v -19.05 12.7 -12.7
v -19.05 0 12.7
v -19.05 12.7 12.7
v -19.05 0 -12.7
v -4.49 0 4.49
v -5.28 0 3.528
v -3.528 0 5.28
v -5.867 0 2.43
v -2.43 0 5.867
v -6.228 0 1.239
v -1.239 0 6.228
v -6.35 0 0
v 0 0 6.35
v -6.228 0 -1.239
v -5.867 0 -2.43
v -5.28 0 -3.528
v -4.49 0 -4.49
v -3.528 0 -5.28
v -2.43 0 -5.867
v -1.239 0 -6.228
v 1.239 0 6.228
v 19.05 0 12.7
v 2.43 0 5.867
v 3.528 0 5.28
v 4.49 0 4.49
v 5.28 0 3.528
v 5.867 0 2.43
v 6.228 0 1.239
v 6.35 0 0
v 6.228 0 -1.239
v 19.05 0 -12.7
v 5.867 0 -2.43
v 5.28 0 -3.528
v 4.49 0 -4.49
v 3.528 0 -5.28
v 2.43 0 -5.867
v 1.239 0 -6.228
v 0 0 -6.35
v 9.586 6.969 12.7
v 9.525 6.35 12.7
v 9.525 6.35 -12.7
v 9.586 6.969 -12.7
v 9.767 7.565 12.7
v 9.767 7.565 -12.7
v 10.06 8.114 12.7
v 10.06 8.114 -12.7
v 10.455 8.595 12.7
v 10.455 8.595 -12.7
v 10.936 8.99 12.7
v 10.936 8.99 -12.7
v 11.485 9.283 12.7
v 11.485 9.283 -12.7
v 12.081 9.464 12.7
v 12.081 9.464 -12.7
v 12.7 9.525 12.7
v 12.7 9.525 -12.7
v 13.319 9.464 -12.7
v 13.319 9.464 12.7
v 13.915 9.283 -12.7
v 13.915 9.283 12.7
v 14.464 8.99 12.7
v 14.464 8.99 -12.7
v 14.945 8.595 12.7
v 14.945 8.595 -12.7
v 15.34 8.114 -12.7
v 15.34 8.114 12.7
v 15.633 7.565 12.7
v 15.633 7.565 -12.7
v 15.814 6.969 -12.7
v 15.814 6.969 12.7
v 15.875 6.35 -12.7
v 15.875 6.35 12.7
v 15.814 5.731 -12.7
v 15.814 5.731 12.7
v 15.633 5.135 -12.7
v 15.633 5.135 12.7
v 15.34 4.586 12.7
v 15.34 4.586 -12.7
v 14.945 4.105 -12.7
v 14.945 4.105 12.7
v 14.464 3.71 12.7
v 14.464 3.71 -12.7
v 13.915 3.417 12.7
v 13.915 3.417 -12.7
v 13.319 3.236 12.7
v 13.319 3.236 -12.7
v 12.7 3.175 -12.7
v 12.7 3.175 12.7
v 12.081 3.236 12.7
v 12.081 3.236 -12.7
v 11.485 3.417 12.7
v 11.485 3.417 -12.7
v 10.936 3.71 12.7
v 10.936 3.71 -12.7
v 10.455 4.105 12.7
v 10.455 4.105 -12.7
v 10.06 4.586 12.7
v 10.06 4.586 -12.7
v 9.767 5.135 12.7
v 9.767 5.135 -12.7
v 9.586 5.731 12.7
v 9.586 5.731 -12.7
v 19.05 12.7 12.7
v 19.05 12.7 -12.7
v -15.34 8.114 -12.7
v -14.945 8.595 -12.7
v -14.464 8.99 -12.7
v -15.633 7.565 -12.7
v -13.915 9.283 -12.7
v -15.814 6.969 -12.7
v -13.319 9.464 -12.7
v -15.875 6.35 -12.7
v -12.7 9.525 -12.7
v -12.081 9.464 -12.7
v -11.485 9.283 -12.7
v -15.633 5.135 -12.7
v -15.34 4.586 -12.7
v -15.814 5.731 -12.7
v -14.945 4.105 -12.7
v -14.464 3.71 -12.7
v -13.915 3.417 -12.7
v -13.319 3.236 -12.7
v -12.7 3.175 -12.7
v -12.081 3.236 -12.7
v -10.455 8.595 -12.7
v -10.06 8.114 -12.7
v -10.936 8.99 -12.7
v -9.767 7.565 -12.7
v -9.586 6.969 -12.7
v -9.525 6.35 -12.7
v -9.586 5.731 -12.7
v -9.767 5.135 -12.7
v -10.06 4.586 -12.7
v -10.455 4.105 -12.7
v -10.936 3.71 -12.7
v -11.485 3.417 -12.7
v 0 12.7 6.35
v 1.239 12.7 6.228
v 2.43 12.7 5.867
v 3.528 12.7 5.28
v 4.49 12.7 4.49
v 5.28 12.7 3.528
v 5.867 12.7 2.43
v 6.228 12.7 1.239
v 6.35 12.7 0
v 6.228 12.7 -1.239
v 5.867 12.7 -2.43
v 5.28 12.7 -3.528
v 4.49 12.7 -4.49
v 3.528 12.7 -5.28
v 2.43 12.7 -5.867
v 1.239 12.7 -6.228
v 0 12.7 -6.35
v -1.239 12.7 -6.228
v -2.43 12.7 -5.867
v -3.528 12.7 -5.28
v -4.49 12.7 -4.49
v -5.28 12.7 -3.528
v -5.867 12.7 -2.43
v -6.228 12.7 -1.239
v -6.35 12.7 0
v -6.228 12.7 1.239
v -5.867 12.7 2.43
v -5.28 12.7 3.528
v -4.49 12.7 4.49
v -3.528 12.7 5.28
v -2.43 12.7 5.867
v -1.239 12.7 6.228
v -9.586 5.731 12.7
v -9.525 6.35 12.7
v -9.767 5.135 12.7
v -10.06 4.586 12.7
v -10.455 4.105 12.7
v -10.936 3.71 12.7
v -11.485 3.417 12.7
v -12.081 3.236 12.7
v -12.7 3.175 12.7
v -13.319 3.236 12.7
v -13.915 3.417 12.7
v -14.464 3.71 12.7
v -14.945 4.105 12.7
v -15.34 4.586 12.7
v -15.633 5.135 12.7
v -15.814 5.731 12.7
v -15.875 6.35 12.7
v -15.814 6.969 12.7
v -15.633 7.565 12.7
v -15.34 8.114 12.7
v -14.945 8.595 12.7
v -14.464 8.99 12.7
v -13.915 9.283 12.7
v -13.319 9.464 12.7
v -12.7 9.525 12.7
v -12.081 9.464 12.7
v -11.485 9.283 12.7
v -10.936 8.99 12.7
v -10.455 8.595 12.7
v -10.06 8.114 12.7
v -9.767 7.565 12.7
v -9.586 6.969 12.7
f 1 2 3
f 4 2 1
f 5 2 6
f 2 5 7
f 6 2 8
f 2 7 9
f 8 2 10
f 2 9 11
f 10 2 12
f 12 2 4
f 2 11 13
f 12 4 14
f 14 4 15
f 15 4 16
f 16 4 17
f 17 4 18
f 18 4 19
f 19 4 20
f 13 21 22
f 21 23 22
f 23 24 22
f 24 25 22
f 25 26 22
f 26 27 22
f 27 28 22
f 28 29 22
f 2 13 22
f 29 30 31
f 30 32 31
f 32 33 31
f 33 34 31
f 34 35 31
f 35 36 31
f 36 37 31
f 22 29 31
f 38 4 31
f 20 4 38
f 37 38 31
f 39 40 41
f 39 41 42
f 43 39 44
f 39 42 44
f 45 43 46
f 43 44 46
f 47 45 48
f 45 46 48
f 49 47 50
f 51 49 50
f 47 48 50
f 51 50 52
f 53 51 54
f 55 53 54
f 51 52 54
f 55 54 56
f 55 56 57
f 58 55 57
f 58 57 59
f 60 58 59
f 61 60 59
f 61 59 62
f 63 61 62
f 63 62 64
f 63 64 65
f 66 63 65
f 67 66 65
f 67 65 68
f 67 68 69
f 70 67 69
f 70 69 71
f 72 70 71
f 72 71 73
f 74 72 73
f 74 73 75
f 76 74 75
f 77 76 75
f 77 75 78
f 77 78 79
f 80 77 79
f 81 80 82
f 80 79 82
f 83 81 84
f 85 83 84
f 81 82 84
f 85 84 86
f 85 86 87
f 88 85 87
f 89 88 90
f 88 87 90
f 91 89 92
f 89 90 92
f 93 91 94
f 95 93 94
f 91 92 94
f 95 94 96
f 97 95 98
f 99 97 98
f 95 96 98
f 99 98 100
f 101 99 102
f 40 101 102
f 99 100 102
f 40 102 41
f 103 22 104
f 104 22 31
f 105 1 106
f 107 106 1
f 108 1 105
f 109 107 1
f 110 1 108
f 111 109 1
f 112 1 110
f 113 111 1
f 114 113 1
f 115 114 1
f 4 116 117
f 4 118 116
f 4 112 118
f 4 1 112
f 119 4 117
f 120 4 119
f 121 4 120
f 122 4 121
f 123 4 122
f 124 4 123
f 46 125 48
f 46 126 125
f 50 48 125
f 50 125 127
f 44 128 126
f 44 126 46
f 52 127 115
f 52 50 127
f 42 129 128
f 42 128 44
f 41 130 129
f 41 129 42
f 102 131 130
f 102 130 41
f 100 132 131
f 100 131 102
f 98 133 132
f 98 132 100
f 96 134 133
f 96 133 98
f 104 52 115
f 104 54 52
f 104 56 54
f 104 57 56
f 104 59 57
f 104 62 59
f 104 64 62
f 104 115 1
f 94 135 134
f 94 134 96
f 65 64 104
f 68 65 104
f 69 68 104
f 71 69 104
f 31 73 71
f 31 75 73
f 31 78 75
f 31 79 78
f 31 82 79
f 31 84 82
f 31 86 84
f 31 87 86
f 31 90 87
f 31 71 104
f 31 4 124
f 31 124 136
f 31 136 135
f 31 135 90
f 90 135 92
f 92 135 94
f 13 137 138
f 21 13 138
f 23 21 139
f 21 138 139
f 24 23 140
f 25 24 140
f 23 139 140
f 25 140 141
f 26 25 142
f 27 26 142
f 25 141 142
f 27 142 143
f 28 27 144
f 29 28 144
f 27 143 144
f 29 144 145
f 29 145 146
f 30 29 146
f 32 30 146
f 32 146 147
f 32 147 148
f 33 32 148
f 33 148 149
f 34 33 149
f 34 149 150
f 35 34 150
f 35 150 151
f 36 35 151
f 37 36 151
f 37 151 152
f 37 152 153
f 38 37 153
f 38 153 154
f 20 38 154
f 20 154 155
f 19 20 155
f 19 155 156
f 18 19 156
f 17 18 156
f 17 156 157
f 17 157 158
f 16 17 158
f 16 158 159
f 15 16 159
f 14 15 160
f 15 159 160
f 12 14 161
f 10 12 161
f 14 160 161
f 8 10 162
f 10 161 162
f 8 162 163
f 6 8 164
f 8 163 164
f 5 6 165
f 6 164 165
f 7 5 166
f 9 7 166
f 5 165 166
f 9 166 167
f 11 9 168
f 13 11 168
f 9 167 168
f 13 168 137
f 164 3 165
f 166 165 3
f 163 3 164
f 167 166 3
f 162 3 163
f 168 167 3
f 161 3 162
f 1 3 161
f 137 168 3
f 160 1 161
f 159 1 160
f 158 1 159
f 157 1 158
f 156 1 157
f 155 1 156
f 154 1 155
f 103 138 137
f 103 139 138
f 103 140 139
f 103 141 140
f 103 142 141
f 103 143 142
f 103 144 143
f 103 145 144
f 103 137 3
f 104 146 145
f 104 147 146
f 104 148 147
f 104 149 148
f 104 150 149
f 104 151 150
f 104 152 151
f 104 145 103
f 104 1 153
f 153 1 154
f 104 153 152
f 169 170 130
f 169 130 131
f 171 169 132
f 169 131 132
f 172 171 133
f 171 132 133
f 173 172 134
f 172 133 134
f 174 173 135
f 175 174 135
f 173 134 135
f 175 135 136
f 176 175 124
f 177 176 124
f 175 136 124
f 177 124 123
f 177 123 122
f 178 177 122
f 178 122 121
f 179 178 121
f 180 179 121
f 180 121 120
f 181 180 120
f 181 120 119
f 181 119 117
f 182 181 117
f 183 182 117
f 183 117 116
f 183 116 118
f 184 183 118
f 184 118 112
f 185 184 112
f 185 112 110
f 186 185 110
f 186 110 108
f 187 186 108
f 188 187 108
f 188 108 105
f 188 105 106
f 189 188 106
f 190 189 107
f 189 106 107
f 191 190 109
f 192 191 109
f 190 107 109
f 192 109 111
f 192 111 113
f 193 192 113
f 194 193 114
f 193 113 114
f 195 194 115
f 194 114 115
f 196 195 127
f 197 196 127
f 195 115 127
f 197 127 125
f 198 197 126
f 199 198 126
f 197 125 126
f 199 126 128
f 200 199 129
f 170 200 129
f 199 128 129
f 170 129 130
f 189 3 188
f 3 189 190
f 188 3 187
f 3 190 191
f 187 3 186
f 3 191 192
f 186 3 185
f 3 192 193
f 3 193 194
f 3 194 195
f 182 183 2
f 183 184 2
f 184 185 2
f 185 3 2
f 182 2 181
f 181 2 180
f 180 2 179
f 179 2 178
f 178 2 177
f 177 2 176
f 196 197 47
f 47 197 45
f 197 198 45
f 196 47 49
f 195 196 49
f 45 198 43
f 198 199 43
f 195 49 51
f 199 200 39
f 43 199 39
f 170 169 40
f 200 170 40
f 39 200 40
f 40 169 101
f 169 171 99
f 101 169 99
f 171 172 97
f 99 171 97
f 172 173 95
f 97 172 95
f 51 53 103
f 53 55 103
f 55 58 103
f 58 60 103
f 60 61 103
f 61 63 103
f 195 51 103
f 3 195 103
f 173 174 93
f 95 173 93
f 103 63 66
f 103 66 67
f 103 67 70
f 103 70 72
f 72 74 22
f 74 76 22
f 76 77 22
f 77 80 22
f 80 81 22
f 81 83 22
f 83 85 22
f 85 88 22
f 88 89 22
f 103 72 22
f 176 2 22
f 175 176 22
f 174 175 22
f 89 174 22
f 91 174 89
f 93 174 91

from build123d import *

# Parameters (mm, degrees)
SKETCH1_W           = 38.1
SKETCH1_H           = 25.4
BOSS_EXTRUDE1_DEPTH = 12.7
SKETCH2_R           = 6.35
CUT_EXTRUDE1_DEPTH  = 27.181720723
SKETCH3_R           = 3.175
CUT_EXTRUDE2_DEPTH  = 35.195796525


with BuildPart() as part:
    # Sketch1 → Boss-Extrude1 (new body)
    with BuildSketch(Plane(origin=(0, 0, 0), x_dir=(1, 0, 0), z_dir=(0, 1, 0))):
        Rectangle(SKETCH1_W, SKETCH1_H)
    extrude(amount=BOSS_EXTRUDE1_DEPTH)

    # Sketch2 → Cut-Extrude1 (cut, through all)
    with BuildSketch(Plane(origin=(0, 12.7, 0), x_dir=(1, 0, 0), z_dir=(0, 1, 0))):
        with Locations(Location((0, 0, 0), (0, 0, 270))):
            Circle(SKETCH2_R)
    extrude(amount=-CUT_EXTRUDE1_DEPTH, mode=Mode.SUBTRACT)

    # Sketch3 → Cut-Extrude2 (cut, through all)
    with BuildSketch(Plane(origin=(0, 0, -12.7), x_dir=(-1, 0, 0), z_dir=(0, 0, -1))):
        with Locations((-12.7, 6.35)):
            Circle(SKETCH3_R)
        with Locations(Location((12.7, 6.35, 0), (0, 0, 180))):
            Circle(SKETCH3_R)
    extrude(amount=-CUT_EXTRUDE2_DEPTH, mode=Mode.SUBTRACT)


solid = part.part
